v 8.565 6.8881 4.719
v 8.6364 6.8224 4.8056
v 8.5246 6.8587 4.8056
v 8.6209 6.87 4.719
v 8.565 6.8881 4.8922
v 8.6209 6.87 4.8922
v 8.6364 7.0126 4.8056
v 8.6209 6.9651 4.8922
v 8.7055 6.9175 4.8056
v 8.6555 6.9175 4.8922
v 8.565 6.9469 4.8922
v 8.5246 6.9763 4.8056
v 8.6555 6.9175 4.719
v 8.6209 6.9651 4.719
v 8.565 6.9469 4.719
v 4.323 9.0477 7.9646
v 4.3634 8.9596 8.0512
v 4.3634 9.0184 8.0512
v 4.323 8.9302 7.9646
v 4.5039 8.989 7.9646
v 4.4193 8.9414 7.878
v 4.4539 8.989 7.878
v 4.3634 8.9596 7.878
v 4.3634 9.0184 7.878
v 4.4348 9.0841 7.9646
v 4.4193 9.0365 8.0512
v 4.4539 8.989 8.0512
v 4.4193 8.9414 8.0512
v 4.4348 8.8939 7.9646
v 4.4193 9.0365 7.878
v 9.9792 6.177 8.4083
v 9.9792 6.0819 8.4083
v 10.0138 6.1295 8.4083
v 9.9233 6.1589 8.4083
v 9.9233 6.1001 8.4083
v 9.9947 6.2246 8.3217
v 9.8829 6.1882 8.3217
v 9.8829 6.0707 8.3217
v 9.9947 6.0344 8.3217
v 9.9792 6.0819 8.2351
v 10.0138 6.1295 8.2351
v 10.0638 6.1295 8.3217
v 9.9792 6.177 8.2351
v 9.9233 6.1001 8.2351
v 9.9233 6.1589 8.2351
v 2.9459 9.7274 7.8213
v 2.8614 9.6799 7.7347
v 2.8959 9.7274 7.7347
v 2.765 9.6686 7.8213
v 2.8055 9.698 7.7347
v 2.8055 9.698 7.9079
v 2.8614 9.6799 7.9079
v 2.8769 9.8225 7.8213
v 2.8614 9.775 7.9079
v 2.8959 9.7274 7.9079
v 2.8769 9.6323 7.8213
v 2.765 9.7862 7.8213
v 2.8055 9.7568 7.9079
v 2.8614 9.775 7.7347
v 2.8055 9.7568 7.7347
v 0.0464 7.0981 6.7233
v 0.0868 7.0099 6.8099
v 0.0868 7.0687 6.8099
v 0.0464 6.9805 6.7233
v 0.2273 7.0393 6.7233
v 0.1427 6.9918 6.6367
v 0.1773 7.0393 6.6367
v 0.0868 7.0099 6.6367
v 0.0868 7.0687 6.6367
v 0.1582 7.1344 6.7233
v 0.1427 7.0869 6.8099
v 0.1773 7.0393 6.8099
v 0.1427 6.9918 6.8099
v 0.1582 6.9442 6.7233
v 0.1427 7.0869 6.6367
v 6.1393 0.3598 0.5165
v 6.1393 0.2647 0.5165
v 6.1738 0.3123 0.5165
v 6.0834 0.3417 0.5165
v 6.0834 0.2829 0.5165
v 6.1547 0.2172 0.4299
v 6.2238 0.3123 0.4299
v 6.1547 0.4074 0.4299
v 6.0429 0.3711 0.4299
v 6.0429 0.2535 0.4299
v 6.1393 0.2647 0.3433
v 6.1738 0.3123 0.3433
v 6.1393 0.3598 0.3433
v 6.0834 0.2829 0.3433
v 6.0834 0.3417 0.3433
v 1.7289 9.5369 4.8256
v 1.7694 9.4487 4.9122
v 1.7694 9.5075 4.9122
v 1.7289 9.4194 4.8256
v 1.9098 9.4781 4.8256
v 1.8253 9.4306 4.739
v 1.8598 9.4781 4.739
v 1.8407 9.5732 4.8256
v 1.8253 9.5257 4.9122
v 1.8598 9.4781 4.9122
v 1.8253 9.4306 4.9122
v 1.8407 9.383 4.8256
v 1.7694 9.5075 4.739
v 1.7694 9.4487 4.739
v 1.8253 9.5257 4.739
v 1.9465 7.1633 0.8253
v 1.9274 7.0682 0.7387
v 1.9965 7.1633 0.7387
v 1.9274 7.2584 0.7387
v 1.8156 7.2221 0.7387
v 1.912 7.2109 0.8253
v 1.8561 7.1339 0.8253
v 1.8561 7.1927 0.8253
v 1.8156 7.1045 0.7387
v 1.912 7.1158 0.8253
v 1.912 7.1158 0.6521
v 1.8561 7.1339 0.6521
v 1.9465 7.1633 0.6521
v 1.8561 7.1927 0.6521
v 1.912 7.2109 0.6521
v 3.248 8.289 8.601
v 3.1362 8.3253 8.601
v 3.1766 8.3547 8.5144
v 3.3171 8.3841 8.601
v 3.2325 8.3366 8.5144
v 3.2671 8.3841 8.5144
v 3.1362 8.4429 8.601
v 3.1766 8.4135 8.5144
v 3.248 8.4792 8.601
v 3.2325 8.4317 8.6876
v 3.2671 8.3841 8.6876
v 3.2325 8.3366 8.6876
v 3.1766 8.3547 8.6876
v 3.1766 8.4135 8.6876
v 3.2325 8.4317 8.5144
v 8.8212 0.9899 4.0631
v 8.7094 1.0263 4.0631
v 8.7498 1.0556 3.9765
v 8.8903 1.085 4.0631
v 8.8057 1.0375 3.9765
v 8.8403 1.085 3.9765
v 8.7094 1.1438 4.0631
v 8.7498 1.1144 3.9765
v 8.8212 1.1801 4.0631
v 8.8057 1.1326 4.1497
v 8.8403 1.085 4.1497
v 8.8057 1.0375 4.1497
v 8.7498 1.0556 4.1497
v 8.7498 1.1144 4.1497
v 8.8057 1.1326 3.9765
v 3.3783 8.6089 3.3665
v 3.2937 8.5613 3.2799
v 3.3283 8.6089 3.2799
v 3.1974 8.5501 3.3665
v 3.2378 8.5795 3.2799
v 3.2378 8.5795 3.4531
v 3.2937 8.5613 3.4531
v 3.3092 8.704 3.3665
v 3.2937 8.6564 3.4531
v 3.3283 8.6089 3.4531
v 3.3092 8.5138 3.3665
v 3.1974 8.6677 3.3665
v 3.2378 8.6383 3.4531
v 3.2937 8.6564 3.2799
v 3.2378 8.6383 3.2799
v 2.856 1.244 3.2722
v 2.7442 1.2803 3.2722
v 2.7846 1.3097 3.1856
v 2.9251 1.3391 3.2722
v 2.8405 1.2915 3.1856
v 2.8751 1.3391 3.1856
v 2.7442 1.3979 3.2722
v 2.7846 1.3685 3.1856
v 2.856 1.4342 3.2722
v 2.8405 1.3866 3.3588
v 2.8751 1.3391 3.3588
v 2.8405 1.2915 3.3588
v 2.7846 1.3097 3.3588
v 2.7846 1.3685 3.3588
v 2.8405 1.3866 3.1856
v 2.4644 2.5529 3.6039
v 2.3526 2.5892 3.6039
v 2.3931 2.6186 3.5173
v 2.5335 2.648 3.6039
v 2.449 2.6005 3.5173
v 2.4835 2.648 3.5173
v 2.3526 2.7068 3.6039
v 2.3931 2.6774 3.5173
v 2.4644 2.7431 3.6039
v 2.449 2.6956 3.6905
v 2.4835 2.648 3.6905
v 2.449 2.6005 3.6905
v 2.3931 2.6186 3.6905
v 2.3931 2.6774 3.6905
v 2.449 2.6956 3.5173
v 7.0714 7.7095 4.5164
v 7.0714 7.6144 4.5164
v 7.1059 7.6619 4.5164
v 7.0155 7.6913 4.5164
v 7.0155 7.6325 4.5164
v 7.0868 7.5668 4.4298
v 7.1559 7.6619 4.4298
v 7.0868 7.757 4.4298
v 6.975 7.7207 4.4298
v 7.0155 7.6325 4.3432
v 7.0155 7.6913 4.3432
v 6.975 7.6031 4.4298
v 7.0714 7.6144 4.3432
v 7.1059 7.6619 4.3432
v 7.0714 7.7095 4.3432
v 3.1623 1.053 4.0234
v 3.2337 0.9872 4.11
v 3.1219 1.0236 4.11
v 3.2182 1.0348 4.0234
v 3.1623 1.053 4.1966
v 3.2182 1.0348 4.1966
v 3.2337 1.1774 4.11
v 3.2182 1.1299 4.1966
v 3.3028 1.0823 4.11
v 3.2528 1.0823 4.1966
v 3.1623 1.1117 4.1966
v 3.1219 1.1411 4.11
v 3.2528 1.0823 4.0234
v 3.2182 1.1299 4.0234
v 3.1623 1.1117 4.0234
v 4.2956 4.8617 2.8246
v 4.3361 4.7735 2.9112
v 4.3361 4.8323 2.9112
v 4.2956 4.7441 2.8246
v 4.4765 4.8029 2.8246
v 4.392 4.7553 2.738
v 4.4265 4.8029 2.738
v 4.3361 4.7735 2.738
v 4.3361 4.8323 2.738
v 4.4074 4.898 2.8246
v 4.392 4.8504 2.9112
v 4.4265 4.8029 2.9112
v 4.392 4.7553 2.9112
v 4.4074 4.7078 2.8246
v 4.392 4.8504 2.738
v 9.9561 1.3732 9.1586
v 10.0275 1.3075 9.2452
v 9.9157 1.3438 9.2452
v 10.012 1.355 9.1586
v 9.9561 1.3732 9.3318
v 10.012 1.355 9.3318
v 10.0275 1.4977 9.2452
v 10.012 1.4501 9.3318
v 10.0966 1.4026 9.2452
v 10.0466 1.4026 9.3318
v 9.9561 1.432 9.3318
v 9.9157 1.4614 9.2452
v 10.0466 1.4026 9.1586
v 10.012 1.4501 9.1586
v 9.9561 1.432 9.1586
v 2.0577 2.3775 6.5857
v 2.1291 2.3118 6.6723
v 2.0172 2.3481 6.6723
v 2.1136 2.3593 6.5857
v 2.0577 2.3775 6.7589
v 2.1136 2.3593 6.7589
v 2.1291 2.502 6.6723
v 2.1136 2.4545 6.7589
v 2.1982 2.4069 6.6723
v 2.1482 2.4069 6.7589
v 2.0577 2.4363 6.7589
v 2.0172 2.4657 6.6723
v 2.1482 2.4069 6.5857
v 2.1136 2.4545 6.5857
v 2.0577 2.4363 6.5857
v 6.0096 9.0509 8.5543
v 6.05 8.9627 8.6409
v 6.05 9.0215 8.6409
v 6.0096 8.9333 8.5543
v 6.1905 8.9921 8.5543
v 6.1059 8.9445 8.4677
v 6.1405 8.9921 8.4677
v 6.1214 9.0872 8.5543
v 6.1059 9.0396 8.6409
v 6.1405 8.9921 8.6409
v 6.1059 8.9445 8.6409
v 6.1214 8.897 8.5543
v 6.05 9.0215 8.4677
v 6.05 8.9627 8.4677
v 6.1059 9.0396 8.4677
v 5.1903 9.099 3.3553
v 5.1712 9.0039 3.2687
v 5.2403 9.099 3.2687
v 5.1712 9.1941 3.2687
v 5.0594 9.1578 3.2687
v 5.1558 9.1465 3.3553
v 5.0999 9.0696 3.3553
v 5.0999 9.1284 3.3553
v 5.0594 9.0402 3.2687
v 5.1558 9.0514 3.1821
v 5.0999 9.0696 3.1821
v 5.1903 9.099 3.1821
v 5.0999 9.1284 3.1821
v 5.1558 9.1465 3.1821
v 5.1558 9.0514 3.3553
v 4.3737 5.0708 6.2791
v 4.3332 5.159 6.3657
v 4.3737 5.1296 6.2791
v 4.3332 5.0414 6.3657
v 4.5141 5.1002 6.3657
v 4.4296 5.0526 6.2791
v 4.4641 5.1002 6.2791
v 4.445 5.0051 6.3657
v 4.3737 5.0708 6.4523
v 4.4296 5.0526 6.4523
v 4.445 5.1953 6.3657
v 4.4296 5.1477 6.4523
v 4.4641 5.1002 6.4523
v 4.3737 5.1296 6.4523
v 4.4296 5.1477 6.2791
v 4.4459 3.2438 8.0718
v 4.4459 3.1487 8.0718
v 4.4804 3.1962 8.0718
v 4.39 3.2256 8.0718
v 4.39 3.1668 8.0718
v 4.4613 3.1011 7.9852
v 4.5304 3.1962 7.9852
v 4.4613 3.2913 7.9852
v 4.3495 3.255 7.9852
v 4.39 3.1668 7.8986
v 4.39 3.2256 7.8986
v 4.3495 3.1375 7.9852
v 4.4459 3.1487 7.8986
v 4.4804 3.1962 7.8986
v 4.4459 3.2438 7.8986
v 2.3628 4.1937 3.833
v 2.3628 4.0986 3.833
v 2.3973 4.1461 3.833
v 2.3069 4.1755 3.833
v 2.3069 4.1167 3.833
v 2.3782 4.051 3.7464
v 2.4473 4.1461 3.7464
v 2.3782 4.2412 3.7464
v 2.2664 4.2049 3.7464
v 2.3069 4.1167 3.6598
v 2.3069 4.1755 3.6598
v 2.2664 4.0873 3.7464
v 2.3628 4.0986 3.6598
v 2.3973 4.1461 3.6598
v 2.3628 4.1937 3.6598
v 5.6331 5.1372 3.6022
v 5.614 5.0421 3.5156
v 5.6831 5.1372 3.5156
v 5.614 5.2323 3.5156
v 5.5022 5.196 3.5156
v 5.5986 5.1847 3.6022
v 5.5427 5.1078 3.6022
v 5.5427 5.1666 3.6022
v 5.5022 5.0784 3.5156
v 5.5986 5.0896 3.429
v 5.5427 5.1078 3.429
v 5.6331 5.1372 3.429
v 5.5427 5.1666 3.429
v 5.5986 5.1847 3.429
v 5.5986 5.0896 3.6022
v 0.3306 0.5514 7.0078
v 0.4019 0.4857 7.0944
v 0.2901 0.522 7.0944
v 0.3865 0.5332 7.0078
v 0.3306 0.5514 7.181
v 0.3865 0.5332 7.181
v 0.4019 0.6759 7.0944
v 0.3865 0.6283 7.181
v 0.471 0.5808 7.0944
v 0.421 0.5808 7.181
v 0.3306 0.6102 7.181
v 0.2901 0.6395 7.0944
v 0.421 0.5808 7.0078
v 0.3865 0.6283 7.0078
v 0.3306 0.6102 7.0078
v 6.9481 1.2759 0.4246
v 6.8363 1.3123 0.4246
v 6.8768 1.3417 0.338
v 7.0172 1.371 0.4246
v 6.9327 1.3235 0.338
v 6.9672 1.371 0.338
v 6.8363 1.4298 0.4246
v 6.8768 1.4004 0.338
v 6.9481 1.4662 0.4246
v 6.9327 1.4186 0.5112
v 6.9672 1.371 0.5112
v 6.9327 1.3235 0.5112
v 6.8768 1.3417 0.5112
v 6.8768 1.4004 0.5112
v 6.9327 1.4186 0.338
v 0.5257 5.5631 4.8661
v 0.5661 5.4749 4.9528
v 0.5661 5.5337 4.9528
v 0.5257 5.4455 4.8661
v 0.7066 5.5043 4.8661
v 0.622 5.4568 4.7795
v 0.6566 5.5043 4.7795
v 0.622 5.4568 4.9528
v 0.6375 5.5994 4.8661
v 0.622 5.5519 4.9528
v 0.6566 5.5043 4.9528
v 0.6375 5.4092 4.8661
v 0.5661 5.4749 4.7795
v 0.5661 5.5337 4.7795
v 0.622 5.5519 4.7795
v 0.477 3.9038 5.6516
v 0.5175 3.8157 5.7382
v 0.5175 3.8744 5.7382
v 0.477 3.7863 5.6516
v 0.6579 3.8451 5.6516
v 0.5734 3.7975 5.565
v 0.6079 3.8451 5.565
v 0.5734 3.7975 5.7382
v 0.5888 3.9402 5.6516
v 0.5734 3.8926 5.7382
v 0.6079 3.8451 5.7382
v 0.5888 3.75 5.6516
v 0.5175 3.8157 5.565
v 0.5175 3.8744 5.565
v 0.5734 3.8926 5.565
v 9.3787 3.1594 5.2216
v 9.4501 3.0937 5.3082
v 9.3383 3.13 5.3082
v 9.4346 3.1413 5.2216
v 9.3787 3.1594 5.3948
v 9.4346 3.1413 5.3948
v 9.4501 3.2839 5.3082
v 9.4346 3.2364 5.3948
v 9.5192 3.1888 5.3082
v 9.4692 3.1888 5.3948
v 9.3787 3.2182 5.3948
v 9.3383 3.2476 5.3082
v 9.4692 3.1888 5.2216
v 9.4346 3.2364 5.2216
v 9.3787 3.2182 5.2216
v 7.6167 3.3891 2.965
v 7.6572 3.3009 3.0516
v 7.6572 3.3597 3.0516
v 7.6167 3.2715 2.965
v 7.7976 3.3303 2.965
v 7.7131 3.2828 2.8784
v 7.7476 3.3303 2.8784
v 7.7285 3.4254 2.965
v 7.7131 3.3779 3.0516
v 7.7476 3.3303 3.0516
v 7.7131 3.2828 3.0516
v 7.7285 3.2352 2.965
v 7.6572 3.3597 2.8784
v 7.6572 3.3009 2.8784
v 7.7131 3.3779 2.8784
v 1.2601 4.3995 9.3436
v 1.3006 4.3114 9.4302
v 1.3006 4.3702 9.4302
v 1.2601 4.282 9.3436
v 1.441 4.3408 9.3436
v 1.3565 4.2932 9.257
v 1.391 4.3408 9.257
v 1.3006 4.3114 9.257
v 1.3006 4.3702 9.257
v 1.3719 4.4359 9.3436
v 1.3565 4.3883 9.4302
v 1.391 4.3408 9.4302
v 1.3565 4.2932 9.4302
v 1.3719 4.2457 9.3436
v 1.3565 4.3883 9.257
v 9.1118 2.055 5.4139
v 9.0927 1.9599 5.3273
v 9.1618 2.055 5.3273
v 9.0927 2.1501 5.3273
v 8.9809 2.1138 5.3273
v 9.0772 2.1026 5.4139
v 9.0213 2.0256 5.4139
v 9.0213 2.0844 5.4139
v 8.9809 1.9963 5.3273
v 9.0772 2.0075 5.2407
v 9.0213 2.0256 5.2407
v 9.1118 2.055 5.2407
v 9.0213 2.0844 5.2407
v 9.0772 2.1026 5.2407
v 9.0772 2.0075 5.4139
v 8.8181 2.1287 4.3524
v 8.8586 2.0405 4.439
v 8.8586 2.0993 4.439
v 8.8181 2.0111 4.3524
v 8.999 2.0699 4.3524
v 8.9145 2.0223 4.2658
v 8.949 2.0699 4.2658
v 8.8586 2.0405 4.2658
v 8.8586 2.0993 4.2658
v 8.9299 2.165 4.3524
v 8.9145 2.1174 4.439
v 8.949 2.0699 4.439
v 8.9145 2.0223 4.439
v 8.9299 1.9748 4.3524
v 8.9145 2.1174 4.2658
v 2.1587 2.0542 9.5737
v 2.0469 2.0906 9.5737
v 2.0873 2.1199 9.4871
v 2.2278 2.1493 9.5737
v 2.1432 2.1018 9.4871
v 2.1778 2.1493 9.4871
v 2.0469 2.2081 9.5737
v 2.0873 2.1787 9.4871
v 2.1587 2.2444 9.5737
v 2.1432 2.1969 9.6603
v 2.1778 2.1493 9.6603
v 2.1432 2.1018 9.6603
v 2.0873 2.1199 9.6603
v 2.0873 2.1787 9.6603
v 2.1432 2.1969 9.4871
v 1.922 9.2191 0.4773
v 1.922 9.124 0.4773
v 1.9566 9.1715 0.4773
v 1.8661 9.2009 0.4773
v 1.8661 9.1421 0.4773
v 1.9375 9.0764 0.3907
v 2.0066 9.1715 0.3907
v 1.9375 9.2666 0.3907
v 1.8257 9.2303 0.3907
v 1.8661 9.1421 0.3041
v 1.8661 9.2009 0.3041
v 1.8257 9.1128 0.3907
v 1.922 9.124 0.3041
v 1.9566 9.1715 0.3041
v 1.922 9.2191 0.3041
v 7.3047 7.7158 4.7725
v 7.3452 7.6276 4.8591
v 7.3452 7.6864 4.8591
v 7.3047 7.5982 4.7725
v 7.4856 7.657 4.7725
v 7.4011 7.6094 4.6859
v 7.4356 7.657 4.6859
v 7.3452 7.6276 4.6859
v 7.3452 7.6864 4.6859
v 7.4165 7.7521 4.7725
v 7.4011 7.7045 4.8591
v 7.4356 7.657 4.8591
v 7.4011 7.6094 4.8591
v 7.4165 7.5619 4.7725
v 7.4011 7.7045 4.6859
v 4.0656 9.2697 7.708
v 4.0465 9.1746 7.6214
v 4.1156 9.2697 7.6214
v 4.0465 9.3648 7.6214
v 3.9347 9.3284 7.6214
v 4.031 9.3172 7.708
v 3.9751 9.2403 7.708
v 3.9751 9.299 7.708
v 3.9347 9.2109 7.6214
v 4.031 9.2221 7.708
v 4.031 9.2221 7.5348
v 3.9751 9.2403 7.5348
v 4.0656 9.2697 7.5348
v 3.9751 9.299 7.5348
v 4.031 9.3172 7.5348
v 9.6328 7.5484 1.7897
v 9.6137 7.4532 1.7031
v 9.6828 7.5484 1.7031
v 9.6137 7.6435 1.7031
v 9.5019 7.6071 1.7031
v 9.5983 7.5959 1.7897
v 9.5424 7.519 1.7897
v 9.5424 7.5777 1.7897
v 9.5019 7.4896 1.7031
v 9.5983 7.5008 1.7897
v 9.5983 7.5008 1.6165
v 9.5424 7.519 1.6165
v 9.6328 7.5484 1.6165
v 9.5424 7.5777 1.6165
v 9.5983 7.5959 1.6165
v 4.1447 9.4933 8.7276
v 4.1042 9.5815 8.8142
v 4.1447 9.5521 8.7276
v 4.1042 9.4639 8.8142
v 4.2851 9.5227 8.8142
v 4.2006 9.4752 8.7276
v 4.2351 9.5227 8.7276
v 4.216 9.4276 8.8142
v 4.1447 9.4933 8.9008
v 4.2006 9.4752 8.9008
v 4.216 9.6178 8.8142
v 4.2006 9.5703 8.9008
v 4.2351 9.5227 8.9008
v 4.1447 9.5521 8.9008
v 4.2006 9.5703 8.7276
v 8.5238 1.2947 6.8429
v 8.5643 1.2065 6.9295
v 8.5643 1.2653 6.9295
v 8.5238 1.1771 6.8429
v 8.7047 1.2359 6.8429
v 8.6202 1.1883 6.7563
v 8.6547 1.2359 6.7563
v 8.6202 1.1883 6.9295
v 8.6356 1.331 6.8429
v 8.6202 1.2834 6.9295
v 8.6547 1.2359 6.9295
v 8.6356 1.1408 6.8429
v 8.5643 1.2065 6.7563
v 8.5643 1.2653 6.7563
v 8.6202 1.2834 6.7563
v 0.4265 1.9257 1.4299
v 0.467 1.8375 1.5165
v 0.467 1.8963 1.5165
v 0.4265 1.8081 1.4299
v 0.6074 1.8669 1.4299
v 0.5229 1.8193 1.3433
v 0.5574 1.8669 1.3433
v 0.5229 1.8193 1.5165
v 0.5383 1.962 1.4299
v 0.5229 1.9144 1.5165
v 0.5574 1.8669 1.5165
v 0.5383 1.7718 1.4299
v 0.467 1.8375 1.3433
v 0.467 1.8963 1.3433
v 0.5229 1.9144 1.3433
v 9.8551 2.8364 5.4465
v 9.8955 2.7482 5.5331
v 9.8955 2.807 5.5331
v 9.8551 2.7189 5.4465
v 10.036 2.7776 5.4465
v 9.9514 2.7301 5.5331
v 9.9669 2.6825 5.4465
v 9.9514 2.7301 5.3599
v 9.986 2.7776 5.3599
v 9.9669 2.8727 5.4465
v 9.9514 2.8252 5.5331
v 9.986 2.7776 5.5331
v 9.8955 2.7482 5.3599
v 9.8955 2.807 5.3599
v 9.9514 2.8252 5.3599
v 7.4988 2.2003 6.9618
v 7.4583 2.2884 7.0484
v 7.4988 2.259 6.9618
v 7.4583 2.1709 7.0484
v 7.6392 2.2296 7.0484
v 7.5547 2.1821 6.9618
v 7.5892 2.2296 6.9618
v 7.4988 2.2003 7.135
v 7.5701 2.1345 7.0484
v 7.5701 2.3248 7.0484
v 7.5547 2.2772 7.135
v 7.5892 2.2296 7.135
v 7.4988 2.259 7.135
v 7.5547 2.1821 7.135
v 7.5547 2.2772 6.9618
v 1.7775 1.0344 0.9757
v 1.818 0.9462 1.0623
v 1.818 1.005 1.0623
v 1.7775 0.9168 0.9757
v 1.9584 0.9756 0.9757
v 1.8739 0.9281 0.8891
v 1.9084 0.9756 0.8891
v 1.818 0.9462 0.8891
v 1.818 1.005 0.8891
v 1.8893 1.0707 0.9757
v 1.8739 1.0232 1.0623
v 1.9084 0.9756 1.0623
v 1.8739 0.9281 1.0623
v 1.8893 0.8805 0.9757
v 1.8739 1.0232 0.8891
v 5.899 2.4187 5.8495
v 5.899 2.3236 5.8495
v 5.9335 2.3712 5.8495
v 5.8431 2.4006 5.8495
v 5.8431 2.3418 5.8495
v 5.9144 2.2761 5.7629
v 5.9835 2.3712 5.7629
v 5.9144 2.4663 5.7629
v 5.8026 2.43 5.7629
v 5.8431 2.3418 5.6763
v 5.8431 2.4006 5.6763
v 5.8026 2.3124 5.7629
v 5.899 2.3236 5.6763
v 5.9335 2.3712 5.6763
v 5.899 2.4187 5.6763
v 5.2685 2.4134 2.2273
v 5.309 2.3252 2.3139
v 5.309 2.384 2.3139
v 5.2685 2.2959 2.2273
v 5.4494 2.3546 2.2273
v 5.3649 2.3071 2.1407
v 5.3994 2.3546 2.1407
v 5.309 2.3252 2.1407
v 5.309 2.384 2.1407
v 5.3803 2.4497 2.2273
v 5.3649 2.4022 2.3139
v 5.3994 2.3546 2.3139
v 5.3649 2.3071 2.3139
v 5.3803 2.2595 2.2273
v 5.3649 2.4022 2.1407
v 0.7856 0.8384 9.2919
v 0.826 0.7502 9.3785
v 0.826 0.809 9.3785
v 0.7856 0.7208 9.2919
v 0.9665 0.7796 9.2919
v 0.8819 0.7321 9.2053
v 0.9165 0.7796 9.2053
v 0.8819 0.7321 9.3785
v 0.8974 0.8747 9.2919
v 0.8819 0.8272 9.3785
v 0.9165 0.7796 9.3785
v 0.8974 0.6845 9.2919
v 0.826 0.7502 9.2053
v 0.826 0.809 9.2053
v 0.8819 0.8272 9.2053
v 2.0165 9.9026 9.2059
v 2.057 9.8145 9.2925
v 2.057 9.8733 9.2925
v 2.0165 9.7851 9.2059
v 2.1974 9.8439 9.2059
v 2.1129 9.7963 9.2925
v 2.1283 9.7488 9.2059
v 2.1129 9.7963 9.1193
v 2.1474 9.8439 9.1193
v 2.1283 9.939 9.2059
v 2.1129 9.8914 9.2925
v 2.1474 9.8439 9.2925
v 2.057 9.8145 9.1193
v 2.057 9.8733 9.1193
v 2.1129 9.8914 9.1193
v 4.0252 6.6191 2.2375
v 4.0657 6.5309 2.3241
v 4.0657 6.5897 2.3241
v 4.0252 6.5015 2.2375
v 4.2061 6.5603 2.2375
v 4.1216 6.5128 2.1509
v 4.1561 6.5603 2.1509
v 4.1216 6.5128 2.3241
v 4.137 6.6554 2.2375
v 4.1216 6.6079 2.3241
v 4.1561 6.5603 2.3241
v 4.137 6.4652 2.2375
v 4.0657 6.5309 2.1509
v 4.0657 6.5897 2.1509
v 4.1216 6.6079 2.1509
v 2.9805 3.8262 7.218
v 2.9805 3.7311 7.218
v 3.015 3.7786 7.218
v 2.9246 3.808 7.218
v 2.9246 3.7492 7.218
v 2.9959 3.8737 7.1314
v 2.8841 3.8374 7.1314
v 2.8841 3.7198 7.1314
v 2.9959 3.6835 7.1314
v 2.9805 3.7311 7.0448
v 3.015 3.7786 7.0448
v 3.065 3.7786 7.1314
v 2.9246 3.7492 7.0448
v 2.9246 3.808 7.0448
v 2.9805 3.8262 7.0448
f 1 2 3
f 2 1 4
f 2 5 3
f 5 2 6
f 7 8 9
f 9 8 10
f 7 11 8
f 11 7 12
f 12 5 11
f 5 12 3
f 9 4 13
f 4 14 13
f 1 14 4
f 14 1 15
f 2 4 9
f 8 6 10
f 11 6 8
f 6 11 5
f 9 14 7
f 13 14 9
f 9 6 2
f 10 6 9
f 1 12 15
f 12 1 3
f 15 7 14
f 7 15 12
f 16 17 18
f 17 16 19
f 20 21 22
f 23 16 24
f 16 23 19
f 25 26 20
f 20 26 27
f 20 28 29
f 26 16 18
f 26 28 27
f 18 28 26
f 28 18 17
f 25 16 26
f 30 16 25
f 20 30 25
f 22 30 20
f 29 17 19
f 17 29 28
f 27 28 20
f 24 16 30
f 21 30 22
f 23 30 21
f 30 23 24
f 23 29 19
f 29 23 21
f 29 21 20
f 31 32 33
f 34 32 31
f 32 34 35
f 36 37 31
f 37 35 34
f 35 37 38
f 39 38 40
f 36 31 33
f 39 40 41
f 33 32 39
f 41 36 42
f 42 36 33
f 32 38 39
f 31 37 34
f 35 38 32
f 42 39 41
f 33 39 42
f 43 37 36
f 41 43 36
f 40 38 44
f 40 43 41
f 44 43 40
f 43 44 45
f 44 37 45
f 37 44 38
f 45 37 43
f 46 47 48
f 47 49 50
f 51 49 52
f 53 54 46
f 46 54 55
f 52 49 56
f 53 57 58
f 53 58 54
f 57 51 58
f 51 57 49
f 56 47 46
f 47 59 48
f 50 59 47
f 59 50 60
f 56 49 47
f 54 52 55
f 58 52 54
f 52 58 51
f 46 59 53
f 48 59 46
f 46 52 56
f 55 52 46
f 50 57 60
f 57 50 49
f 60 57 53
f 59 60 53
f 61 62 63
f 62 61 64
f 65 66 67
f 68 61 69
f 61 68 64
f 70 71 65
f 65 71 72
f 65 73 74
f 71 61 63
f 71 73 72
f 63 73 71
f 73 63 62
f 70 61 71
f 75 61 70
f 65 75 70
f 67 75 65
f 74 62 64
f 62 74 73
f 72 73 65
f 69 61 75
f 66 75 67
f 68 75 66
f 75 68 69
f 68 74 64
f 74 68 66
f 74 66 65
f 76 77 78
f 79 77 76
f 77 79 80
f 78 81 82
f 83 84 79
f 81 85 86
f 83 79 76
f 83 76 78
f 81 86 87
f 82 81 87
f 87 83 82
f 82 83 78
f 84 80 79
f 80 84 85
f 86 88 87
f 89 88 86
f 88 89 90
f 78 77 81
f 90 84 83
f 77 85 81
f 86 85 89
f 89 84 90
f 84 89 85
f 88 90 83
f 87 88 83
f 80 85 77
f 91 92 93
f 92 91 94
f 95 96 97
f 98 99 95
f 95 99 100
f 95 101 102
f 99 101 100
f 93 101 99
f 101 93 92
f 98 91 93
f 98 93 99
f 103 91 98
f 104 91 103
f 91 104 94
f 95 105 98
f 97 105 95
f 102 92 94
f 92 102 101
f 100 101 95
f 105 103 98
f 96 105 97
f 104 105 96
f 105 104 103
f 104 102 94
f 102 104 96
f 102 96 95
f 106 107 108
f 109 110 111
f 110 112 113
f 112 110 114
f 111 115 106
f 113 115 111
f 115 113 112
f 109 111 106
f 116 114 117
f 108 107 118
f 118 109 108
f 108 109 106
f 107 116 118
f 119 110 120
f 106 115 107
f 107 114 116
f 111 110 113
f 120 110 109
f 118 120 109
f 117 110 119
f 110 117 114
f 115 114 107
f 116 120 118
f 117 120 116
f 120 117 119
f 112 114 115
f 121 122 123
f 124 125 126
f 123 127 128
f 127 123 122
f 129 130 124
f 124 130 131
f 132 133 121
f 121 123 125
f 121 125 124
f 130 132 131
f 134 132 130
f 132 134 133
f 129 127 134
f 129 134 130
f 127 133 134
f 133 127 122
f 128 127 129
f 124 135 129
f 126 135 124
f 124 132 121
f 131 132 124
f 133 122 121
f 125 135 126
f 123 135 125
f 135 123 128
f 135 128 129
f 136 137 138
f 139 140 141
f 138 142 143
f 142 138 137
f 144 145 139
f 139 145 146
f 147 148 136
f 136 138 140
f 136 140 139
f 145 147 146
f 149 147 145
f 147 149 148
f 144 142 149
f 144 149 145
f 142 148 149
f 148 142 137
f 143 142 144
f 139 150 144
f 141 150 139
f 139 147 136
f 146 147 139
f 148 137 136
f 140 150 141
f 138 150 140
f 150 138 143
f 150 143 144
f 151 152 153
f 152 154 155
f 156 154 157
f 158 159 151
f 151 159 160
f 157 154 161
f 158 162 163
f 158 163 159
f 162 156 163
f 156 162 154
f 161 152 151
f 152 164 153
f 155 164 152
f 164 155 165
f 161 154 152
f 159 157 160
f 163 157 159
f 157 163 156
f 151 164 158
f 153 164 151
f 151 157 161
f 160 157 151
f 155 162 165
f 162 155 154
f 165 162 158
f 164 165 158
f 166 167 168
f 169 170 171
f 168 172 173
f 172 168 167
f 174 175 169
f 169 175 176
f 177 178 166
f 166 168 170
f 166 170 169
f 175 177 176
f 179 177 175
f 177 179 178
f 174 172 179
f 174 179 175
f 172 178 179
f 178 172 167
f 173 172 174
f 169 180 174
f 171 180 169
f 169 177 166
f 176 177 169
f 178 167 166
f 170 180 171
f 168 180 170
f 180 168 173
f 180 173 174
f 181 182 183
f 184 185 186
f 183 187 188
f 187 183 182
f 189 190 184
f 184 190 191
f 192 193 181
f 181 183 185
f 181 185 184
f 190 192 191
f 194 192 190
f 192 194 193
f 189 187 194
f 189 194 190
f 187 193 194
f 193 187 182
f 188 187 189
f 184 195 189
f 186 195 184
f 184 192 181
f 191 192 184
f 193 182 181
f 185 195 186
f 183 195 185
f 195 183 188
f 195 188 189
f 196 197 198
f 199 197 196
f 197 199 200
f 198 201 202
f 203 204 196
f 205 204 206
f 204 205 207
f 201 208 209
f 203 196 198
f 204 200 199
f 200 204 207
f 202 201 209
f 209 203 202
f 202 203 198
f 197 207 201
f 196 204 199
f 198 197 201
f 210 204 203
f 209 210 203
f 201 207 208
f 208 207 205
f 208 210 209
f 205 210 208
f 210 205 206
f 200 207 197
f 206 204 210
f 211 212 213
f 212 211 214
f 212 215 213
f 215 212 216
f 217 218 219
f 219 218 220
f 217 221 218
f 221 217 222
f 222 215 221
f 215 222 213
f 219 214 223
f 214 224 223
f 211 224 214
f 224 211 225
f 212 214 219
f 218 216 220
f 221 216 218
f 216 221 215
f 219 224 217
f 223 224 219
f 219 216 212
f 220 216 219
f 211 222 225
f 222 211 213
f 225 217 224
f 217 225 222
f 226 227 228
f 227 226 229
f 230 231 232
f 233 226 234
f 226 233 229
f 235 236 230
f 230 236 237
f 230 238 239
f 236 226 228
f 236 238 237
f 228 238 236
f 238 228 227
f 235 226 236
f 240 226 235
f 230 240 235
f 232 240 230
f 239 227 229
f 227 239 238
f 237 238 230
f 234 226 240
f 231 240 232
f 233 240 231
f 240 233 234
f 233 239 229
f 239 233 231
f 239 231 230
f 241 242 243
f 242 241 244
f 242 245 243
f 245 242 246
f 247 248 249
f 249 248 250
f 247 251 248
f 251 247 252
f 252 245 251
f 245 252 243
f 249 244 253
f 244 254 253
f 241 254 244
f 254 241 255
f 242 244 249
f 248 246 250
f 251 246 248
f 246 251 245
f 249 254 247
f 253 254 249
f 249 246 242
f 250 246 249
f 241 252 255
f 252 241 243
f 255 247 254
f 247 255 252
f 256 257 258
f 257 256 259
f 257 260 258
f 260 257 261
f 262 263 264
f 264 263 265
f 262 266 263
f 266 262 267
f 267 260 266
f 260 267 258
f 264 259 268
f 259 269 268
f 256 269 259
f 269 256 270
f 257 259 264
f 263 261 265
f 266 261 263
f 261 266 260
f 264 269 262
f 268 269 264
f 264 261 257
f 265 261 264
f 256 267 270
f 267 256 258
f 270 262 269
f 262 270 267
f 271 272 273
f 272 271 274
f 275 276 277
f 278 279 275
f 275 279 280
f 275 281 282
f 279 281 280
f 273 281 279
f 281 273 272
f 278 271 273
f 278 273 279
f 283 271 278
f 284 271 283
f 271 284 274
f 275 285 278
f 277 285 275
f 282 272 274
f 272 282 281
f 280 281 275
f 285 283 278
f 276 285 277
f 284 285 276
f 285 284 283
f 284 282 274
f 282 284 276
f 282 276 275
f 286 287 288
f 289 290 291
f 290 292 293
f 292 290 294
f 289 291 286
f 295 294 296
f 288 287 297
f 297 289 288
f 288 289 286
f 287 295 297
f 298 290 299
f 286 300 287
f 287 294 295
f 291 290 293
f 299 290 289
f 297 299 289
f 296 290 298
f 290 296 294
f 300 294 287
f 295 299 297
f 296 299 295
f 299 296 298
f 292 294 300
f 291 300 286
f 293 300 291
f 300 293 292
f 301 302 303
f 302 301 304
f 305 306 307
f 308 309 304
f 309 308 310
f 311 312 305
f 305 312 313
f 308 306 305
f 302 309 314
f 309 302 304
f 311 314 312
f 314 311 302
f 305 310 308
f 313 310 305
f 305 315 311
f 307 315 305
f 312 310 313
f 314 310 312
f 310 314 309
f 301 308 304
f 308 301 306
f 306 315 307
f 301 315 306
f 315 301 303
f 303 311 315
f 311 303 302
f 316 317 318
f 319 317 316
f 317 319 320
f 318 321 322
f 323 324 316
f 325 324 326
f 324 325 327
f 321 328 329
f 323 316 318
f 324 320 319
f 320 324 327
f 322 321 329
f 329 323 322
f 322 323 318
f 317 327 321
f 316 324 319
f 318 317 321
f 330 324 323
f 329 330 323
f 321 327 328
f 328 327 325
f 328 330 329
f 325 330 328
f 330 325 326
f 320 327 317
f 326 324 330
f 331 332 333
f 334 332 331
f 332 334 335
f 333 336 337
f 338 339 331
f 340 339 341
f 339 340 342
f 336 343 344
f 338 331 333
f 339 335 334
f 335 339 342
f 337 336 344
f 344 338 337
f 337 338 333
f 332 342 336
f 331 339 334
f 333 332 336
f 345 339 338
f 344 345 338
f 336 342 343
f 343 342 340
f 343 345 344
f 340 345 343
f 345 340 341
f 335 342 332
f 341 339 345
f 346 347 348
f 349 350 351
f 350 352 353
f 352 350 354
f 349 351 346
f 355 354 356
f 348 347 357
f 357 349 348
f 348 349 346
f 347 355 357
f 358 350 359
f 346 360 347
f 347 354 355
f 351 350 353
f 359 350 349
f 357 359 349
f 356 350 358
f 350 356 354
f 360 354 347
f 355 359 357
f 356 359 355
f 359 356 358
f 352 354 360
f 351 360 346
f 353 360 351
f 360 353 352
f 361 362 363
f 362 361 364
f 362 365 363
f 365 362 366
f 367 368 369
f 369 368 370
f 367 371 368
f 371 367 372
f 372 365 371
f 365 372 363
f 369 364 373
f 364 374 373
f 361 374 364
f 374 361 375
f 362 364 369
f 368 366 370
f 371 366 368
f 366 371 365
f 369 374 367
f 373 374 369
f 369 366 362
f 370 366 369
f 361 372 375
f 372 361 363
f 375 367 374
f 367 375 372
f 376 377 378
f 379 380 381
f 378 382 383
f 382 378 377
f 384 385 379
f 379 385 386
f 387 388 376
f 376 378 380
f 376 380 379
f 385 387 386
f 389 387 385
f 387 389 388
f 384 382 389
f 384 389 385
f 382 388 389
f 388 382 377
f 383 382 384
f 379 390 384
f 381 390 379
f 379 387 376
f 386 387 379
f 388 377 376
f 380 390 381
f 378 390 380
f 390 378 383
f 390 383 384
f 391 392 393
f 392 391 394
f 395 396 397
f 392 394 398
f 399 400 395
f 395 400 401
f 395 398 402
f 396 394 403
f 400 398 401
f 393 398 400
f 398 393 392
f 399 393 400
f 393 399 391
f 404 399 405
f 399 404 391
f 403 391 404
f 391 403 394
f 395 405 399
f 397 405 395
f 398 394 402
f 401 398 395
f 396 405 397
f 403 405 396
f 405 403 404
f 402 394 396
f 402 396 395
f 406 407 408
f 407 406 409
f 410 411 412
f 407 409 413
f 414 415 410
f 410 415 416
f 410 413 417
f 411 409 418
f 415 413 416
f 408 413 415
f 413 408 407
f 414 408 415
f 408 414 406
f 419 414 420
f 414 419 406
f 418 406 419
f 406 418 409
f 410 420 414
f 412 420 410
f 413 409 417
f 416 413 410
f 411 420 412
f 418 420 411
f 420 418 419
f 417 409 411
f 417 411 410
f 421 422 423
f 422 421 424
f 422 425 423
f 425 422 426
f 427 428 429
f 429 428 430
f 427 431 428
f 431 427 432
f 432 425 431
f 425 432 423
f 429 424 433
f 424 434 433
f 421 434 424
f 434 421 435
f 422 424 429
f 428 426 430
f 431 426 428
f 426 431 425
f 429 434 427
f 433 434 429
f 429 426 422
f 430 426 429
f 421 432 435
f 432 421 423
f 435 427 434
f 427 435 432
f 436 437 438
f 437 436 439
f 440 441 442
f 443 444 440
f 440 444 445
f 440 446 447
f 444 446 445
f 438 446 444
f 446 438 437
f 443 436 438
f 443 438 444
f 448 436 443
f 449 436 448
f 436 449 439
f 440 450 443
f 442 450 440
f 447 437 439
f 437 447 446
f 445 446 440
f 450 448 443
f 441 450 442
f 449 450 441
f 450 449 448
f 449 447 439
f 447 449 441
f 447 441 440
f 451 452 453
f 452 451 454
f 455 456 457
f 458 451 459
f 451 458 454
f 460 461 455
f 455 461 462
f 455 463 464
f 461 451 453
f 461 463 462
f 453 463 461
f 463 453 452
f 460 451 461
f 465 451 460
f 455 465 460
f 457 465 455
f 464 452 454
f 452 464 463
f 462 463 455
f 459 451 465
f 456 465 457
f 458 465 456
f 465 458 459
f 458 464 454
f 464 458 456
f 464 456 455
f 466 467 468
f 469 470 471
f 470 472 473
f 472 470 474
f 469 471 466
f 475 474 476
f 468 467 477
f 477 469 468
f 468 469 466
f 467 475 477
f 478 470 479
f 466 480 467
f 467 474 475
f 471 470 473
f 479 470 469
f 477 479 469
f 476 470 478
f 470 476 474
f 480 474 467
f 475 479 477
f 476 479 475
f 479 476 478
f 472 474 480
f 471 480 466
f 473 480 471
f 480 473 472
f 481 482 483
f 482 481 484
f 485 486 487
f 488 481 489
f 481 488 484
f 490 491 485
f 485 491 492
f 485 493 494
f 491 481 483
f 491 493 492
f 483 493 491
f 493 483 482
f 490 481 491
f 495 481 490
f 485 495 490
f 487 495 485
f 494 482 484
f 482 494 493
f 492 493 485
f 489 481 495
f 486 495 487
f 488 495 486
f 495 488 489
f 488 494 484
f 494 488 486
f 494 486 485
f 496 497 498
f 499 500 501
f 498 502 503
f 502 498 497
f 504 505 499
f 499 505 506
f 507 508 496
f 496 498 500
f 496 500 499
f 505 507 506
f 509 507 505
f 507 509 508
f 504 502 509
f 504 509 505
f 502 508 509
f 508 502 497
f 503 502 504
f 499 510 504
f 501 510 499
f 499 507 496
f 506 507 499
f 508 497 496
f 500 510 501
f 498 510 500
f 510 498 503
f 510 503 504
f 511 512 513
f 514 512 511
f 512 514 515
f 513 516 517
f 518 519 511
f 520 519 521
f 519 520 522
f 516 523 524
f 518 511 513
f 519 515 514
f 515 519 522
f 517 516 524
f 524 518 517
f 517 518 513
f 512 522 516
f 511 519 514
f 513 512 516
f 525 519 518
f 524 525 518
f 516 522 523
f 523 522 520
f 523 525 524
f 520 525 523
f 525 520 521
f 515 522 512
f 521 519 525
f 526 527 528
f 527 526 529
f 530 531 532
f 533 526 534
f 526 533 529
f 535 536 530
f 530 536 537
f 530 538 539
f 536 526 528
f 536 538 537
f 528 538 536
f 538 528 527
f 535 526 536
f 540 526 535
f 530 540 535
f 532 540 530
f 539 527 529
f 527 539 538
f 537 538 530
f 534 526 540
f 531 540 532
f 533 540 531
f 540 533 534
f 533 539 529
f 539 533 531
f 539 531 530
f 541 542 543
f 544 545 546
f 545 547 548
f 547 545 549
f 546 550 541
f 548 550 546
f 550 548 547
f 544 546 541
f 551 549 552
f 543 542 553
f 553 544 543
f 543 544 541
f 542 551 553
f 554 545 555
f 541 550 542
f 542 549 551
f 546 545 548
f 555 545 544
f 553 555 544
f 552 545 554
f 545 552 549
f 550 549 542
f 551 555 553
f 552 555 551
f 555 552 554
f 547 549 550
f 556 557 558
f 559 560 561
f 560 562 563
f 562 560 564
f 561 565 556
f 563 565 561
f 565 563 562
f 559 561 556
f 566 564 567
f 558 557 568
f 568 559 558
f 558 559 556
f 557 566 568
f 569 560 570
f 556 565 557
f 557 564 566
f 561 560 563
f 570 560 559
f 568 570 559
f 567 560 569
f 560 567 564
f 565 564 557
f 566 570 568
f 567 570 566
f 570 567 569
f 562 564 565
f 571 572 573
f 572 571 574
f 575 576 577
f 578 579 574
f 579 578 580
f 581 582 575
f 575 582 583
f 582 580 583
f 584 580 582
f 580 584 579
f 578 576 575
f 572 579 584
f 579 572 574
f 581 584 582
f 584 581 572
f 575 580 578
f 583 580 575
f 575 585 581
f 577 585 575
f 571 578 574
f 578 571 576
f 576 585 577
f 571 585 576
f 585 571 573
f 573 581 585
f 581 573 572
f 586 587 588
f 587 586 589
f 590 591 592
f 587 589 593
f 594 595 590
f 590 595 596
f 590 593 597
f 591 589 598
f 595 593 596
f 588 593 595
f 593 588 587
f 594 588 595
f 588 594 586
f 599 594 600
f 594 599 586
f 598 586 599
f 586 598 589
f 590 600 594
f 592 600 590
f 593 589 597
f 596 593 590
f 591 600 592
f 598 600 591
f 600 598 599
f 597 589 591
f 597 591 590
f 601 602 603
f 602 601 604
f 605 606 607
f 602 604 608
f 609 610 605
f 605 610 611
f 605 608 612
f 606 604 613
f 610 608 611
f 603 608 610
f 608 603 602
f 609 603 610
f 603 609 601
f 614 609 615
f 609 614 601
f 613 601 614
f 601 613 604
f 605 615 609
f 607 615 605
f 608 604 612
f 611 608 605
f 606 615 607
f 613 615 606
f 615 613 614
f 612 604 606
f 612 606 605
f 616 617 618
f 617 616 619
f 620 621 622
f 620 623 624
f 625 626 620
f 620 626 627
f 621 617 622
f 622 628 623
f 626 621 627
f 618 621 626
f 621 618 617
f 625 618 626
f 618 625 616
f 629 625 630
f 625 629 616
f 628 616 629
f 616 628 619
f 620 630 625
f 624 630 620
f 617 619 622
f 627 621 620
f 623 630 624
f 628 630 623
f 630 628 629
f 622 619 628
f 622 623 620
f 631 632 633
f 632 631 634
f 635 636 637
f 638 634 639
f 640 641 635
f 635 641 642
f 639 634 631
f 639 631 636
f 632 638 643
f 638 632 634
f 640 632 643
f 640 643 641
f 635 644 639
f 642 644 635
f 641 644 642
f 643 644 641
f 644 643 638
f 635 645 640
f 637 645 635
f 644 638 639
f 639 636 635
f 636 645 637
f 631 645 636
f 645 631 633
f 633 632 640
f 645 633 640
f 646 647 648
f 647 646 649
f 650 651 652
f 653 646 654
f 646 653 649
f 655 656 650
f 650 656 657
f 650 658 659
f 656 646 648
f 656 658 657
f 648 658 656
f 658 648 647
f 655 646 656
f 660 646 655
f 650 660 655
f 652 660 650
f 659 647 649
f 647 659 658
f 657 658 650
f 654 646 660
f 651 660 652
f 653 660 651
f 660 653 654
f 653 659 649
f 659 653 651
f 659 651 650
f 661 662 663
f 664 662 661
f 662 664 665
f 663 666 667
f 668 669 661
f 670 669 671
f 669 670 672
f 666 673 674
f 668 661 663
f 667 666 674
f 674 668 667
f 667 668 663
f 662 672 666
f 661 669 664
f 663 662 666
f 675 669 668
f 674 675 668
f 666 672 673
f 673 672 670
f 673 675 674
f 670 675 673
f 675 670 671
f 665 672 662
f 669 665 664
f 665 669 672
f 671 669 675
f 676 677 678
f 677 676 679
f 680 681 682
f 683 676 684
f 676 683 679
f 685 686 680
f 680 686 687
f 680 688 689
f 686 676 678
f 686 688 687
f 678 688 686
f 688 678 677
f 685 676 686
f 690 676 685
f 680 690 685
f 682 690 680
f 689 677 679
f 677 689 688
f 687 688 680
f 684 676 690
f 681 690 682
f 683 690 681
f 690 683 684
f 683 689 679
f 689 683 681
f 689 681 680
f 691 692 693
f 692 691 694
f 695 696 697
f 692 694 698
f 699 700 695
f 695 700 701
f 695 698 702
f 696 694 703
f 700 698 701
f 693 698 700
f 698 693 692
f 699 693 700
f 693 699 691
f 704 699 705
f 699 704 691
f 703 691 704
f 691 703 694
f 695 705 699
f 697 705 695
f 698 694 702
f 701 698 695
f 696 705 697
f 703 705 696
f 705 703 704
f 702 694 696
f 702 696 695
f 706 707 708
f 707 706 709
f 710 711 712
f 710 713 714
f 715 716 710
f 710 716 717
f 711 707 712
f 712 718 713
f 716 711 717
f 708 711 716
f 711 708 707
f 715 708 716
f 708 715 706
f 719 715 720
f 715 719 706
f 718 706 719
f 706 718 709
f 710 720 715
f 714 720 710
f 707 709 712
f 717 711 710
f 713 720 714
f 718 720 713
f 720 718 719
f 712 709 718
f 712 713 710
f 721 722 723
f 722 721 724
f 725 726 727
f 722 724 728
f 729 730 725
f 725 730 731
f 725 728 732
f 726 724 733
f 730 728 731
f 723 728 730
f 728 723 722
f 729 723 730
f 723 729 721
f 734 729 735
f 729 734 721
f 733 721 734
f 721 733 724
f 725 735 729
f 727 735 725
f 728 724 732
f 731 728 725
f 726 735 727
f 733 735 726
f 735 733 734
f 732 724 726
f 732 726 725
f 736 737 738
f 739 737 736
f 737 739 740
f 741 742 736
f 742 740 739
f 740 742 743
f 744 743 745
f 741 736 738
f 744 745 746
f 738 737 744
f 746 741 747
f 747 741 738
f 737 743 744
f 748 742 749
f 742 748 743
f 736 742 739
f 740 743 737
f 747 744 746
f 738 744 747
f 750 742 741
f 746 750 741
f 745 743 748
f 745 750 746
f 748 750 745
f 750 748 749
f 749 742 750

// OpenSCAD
points=([for(i=[0:49])[rnd(10),rnd(10),rnd(10)]]);
function rnd(a = 1, b = 0, s = []) = 
  s == [] ? 
   (rands(min(a, b), max(   a, b), 1)[0]) 
  : 
   (rands(min(a, b), max(a, b), 1, s)[0])
  ; 
for (i=[0:max(0,len(points)-1)])translate(points[i])sphere(0.1);
a=quickhull(points);
echo(len(points),len(a));
for (i=[0:max(0,len(a)-1)]){
echo(a[i]);
polyhedron(a[i],[[0,1,2]]);
}
function quickhull (v)=
let(p0=v[0],p1=v[1],p2=v[len(v)-1],
n=face_normal(p0,p1,p2),
a_side=[for (i=[0:max(0,len(v)-1)]) if(distance_point2plane(v[i], p0, n)<0)v[i]],
b_side=[for (i=[0:max(0,len(v)-1)]) if(distance_point2plane(v[i], p0, n)>=0)v[i]],
e=echo(str("a,b:"),len(a_side),len(b_side))

)
concat(
quickhull_prime (v,p2,p1,p0),
quickhull_prime (v,p2,p1,p2)
)
;

function quickhull_prime (v,p0,p1,p2,c=7)=
len(v)>0&&c>0?
let(
n=face_normal(p0,p1,p2),
 v_side=[for (i=[0:max(0,len(v)-1)]) if(distance_point2plane(v[i], p0, n)>=0)v[i]],
p3=v_side[index_max([for (i=[0:max(0,len(v_side)-1)])  distance_point2plane(v_side[i], p0, n)])],
//p3=v[index_max([for (i=[0:max(0,len(v)-1)])  distance_point2plane(v[i], p0, n)])]
e=echo(c,len(v_side),p3,v_side)
)
len(v_side>0)?
concat(
quickhull_prime (v_side,p0,p1,p3,c-1),
quickhull_prime (v_side,p1,p2,p3,c-1),
quickhull_prime (v_side,p2,p0,p3,c-1))
:
[[p0,p1,p2]]
:
[[p0,p1,p2]]
;


function index_min(l) = search(min(l), l)[0];
function index_max(l) = search(max(l), l)[0];

function distance_point2plane(point, planes_origin, planes_normal) =
let (v = point - planes_origin)   
(
v.x * planes_normal.x + 
v.y * planes_normal.y + 
v.z * planes_normal.z
); 

function face_normal(point_a,point_b,point_c)=
let(u=point_a-point_b,v=point_a-point_c)
un([u[1]*v[2]-u[2]*v[1],u[2]*v[0]-u[0]*v[2],u[0]*v[1]-u[1]*v[0]]);

function un(v)=v/max(len3(v),1e-64);
function len3(v) =len(v)>1?
sqrt(addl([for(i=[0:len(v)-1])pow(v[i], 2)]))
:len(v)==1?v[0]:v; 
function addl(l,c=0)= len(l)-1 >c?l[c]+addl(l,c+1):l[c];
